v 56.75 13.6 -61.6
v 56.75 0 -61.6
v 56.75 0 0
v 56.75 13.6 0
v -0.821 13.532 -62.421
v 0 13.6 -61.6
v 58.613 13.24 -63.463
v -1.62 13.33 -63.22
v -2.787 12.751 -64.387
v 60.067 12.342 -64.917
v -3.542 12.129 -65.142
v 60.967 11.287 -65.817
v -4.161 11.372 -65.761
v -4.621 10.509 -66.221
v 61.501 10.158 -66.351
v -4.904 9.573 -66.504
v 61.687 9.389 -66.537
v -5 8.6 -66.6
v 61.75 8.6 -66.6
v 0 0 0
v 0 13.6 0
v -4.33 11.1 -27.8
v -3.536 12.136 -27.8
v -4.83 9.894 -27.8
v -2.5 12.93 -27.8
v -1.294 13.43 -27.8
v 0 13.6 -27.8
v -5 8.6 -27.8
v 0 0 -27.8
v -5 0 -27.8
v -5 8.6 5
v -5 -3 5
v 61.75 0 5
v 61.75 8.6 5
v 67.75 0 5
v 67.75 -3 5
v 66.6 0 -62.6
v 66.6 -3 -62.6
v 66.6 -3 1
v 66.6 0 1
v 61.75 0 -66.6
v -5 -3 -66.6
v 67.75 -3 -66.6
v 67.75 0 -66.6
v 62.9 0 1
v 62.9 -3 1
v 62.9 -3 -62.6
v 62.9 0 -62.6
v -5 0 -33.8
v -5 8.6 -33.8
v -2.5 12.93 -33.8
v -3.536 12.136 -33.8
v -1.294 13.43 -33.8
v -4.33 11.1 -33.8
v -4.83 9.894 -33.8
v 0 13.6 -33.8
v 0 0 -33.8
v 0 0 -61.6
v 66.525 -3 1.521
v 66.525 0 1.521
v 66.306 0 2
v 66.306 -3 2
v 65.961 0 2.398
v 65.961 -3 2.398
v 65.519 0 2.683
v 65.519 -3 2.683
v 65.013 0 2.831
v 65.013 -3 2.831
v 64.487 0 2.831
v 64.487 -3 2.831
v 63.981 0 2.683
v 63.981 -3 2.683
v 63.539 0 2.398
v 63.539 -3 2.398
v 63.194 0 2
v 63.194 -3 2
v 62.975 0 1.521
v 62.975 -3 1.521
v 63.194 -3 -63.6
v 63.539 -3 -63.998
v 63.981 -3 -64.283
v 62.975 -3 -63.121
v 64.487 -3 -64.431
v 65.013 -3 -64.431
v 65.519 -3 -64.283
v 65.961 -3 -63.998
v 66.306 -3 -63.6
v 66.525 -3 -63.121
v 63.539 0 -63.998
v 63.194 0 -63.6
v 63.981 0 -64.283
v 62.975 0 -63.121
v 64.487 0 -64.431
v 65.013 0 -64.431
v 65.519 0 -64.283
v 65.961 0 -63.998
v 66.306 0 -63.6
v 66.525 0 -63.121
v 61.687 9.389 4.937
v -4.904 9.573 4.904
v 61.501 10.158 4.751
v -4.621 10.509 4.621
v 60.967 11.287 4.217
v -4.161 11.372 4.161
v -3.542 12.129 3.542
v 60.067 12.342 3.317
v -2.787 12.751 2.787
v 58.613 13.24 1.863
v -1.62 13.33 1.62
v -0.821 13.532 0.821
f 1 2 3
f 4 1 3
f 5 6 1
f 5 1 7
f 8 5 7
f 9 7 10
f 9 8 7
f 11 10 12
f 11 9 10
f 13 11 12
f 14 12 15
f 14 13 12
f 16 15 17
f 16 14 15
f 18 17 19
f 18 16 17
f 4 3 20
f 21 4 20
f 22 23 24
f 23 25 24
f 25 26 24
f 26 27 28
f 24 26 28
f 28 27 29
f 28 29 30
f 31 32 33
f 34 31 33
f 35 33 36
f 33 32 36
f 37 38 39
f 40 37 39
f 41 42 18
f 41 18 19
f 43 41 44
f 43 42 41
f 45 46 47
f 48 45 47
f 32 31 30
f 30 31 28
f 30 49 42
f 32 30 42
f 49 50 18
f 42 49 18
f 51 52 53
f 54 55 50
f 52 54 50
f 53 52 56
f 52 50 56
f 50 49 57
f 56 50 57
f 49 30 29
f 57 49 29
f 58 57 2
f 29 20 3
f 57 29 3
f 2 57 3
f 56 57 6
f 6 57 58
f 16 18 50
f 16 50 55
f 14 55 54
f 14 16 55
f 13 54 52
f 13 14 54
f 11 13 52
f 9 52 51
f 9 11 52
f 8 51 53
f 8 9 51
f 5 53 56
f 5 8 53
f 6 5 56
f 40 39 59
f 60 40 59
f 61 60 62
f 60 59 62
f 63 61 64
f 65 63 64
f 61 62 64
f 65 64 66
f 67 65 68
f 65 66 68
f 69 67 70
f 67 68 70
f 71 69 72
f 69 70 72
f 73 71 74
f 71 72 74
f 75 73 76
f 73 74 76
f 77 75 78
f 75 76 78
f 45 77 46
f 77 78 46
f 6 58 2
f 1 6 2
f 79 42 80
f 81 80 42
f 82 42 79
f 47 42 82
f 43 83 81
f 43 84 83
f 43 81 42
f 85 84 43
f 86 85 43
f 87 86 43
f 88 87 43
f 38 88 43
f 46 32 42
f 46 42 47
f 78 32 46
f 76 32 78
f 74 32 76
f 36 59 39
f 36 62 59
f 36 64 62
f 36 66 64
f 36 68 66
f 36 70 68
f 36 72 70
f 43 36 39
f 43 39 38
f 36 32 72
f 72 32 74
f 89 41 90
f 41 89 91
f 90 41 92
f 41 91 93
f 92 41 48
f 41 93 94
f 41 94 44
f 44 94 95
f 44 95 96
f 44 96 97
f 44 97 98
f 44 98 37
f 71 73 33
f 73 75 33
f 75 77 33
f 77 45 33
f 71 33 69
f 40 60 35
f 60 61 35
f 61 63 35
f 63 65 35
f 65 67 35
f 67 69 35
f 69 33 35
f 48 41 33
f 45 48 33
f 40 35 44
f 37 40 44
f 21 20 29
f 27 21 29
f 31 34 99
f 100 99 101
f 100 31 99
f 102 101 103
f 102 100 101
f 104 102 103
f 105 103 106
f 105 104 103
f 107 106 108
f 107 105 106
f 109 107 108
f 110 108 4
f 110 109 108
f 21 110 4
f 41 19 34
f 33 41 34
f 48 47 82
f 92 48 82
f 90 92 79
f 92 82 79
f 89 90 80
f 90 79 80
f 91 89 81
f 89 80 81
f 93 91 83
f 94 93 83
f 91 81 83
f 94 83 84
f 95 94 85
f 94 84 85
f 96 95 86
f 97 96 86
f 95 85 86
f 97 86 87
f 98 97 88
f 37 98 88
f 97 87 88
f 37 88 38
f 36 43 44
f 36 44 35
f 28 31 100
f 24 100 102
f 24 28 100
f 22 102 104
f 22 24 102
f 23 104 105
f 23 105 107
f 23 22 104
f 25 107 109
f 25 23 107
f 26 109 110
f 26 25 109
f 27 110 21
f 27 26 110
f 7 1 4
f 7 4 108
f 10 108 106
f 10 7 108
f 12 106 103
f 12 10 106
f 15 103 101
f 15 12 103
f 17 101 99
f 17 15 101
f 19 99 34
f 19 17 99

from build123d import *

# Parameters (mm, degrees)
BOSS_EXTRUDE1_DEPTH = 13.6
BOSS_EXTRUDE2_DEPTH = 3
FILLET1_START       = -66.6
FILLET1_DEPTH       = 71.6
FILLET1_START_2     = -6
FILLET1_2_DEPTH     = 69
SKETCH3_W           = 6
SKETCH3_H           = 71.6
BOSS_EXTRUDE4_DEPTH = 3


with BuildPart() as part:
    # Sketch1 → Boss-Extrude1 (new body)
    with BuildSketch(Plane(origin=(0, 0, 0), x_dir=(1, 0, 0), z_dir=(0, 1, 0))):
        Polygon((56.75, 30.8), (61.75, 30.8), (61.75, 66.6), (-5, 66.6), (-5, 33.8), (0, 33.8), (0, 61.6), (56.75, 61.6), align=None)
        Polygon((-5, 27.8), (-5, -5), (61.75, -5), (61.75, 30.8), (56.75, 30.8), (56.75, 0), (0, 0), (0, 27.8), align=None)
    extrude(amount=BOSS_EXTRUDE1_DEPTH)

    # Sketch2 → Boss-Extrude2 (add)
    with BuildSketch(Plane.XZ):
        Polygon((0, 0), (56.75, 0), (56.75, -61.6), (0, -61.6), (0, -33.8), (-5, -33.8), (-5, -66.6), (61.75, -66.6), (61.75, 5), (-5, 5), (-5, -27.8), (0, -27.8), align=None)
        Polygon((-5, -27.8), (-5, -33.8), (0, -33.8), (0, -61.6), (56.75, -61.6), (56.75, 0), (0, 0), (0, -27.8), align=None)
    extrude(amount=BOSS_EXTRUDE2_DEPTH)

    # Fillet1: read off the stored shape, not the designer's step
    # Fillet1 outline → Fillet1 (cut)
    with BuildSketch(Plane.XY.offset(FILLET1_START)):
        with BuildLine():
            Line((-5, 13.6), (-5, 8.6))
            ThreePointArc((-5, 8.6), (-3.535533906, 12.135533906), (0, 13.6))
            Line((0, 13.6), (-5, 13.6))
        make_face()
        with BuildLine():
            Line((61.75, 13.6), (56.75, 13.6))
            ThreePointArc((56.75, 13.6), (60.285533906, 12.135533906), (61.75, 8.6))
            Line((61.75, 8.6), (61.75, 13.6))
        make_face()
    extrude(amount=FILLET1_DEPTH, mode=Mode.SUBTRACT)

    # Fillet1 2 outline → Fillet1 2 (cut)
    with BuildSketch(Plane.YZ.offset(FILLET1_START_2)):
        with BuildLine():
            Line((13.6, 5), (8.6, 5))
            ThreePointArc((8.6, 5), (12.135533906, 3.535533906), (13.6, 0))
            Line((13.6, 0), (13.6, 5))
        make_face()
        with BuildLine():
            ThreePointArc((13.6, -61.6), (12.135533906, -65.135533906), (8.6, -66.6))
            Line((8.6, -66.6), (13.6, -66.6))
            Line((13.6, -66.6), (13.6, -61.6))
        make_face()
    extrude(amount=FILLET1_2_DEPTH, mode=Mode.SUBTRACT)

    # Sketch3 → Boss-Extrude4 (add)
    with BuildSketch(Plane.XZ.offset(3)):
        with Locations((64.75, -30.8)):
            Rectangle(SKETCH3_W, SKETCH3_H)
        with BuildLine():
            ThreePointArc((62.9, -62.6), (64.75, -64.45), (66.6, -62.6))
            Line((66.6, -62.6), (66.6, 1))
            ThreePointArc((66.6, 1), (64.75, 2.85), (62.9, 1))
            Line((62.9, 1), (62.9, -62.6))
        make_face(mode=Mode.SUBTRACT)
    extrude(amount=-BOSS_EXTRUDE4_DEPTH)


solid = part.part
